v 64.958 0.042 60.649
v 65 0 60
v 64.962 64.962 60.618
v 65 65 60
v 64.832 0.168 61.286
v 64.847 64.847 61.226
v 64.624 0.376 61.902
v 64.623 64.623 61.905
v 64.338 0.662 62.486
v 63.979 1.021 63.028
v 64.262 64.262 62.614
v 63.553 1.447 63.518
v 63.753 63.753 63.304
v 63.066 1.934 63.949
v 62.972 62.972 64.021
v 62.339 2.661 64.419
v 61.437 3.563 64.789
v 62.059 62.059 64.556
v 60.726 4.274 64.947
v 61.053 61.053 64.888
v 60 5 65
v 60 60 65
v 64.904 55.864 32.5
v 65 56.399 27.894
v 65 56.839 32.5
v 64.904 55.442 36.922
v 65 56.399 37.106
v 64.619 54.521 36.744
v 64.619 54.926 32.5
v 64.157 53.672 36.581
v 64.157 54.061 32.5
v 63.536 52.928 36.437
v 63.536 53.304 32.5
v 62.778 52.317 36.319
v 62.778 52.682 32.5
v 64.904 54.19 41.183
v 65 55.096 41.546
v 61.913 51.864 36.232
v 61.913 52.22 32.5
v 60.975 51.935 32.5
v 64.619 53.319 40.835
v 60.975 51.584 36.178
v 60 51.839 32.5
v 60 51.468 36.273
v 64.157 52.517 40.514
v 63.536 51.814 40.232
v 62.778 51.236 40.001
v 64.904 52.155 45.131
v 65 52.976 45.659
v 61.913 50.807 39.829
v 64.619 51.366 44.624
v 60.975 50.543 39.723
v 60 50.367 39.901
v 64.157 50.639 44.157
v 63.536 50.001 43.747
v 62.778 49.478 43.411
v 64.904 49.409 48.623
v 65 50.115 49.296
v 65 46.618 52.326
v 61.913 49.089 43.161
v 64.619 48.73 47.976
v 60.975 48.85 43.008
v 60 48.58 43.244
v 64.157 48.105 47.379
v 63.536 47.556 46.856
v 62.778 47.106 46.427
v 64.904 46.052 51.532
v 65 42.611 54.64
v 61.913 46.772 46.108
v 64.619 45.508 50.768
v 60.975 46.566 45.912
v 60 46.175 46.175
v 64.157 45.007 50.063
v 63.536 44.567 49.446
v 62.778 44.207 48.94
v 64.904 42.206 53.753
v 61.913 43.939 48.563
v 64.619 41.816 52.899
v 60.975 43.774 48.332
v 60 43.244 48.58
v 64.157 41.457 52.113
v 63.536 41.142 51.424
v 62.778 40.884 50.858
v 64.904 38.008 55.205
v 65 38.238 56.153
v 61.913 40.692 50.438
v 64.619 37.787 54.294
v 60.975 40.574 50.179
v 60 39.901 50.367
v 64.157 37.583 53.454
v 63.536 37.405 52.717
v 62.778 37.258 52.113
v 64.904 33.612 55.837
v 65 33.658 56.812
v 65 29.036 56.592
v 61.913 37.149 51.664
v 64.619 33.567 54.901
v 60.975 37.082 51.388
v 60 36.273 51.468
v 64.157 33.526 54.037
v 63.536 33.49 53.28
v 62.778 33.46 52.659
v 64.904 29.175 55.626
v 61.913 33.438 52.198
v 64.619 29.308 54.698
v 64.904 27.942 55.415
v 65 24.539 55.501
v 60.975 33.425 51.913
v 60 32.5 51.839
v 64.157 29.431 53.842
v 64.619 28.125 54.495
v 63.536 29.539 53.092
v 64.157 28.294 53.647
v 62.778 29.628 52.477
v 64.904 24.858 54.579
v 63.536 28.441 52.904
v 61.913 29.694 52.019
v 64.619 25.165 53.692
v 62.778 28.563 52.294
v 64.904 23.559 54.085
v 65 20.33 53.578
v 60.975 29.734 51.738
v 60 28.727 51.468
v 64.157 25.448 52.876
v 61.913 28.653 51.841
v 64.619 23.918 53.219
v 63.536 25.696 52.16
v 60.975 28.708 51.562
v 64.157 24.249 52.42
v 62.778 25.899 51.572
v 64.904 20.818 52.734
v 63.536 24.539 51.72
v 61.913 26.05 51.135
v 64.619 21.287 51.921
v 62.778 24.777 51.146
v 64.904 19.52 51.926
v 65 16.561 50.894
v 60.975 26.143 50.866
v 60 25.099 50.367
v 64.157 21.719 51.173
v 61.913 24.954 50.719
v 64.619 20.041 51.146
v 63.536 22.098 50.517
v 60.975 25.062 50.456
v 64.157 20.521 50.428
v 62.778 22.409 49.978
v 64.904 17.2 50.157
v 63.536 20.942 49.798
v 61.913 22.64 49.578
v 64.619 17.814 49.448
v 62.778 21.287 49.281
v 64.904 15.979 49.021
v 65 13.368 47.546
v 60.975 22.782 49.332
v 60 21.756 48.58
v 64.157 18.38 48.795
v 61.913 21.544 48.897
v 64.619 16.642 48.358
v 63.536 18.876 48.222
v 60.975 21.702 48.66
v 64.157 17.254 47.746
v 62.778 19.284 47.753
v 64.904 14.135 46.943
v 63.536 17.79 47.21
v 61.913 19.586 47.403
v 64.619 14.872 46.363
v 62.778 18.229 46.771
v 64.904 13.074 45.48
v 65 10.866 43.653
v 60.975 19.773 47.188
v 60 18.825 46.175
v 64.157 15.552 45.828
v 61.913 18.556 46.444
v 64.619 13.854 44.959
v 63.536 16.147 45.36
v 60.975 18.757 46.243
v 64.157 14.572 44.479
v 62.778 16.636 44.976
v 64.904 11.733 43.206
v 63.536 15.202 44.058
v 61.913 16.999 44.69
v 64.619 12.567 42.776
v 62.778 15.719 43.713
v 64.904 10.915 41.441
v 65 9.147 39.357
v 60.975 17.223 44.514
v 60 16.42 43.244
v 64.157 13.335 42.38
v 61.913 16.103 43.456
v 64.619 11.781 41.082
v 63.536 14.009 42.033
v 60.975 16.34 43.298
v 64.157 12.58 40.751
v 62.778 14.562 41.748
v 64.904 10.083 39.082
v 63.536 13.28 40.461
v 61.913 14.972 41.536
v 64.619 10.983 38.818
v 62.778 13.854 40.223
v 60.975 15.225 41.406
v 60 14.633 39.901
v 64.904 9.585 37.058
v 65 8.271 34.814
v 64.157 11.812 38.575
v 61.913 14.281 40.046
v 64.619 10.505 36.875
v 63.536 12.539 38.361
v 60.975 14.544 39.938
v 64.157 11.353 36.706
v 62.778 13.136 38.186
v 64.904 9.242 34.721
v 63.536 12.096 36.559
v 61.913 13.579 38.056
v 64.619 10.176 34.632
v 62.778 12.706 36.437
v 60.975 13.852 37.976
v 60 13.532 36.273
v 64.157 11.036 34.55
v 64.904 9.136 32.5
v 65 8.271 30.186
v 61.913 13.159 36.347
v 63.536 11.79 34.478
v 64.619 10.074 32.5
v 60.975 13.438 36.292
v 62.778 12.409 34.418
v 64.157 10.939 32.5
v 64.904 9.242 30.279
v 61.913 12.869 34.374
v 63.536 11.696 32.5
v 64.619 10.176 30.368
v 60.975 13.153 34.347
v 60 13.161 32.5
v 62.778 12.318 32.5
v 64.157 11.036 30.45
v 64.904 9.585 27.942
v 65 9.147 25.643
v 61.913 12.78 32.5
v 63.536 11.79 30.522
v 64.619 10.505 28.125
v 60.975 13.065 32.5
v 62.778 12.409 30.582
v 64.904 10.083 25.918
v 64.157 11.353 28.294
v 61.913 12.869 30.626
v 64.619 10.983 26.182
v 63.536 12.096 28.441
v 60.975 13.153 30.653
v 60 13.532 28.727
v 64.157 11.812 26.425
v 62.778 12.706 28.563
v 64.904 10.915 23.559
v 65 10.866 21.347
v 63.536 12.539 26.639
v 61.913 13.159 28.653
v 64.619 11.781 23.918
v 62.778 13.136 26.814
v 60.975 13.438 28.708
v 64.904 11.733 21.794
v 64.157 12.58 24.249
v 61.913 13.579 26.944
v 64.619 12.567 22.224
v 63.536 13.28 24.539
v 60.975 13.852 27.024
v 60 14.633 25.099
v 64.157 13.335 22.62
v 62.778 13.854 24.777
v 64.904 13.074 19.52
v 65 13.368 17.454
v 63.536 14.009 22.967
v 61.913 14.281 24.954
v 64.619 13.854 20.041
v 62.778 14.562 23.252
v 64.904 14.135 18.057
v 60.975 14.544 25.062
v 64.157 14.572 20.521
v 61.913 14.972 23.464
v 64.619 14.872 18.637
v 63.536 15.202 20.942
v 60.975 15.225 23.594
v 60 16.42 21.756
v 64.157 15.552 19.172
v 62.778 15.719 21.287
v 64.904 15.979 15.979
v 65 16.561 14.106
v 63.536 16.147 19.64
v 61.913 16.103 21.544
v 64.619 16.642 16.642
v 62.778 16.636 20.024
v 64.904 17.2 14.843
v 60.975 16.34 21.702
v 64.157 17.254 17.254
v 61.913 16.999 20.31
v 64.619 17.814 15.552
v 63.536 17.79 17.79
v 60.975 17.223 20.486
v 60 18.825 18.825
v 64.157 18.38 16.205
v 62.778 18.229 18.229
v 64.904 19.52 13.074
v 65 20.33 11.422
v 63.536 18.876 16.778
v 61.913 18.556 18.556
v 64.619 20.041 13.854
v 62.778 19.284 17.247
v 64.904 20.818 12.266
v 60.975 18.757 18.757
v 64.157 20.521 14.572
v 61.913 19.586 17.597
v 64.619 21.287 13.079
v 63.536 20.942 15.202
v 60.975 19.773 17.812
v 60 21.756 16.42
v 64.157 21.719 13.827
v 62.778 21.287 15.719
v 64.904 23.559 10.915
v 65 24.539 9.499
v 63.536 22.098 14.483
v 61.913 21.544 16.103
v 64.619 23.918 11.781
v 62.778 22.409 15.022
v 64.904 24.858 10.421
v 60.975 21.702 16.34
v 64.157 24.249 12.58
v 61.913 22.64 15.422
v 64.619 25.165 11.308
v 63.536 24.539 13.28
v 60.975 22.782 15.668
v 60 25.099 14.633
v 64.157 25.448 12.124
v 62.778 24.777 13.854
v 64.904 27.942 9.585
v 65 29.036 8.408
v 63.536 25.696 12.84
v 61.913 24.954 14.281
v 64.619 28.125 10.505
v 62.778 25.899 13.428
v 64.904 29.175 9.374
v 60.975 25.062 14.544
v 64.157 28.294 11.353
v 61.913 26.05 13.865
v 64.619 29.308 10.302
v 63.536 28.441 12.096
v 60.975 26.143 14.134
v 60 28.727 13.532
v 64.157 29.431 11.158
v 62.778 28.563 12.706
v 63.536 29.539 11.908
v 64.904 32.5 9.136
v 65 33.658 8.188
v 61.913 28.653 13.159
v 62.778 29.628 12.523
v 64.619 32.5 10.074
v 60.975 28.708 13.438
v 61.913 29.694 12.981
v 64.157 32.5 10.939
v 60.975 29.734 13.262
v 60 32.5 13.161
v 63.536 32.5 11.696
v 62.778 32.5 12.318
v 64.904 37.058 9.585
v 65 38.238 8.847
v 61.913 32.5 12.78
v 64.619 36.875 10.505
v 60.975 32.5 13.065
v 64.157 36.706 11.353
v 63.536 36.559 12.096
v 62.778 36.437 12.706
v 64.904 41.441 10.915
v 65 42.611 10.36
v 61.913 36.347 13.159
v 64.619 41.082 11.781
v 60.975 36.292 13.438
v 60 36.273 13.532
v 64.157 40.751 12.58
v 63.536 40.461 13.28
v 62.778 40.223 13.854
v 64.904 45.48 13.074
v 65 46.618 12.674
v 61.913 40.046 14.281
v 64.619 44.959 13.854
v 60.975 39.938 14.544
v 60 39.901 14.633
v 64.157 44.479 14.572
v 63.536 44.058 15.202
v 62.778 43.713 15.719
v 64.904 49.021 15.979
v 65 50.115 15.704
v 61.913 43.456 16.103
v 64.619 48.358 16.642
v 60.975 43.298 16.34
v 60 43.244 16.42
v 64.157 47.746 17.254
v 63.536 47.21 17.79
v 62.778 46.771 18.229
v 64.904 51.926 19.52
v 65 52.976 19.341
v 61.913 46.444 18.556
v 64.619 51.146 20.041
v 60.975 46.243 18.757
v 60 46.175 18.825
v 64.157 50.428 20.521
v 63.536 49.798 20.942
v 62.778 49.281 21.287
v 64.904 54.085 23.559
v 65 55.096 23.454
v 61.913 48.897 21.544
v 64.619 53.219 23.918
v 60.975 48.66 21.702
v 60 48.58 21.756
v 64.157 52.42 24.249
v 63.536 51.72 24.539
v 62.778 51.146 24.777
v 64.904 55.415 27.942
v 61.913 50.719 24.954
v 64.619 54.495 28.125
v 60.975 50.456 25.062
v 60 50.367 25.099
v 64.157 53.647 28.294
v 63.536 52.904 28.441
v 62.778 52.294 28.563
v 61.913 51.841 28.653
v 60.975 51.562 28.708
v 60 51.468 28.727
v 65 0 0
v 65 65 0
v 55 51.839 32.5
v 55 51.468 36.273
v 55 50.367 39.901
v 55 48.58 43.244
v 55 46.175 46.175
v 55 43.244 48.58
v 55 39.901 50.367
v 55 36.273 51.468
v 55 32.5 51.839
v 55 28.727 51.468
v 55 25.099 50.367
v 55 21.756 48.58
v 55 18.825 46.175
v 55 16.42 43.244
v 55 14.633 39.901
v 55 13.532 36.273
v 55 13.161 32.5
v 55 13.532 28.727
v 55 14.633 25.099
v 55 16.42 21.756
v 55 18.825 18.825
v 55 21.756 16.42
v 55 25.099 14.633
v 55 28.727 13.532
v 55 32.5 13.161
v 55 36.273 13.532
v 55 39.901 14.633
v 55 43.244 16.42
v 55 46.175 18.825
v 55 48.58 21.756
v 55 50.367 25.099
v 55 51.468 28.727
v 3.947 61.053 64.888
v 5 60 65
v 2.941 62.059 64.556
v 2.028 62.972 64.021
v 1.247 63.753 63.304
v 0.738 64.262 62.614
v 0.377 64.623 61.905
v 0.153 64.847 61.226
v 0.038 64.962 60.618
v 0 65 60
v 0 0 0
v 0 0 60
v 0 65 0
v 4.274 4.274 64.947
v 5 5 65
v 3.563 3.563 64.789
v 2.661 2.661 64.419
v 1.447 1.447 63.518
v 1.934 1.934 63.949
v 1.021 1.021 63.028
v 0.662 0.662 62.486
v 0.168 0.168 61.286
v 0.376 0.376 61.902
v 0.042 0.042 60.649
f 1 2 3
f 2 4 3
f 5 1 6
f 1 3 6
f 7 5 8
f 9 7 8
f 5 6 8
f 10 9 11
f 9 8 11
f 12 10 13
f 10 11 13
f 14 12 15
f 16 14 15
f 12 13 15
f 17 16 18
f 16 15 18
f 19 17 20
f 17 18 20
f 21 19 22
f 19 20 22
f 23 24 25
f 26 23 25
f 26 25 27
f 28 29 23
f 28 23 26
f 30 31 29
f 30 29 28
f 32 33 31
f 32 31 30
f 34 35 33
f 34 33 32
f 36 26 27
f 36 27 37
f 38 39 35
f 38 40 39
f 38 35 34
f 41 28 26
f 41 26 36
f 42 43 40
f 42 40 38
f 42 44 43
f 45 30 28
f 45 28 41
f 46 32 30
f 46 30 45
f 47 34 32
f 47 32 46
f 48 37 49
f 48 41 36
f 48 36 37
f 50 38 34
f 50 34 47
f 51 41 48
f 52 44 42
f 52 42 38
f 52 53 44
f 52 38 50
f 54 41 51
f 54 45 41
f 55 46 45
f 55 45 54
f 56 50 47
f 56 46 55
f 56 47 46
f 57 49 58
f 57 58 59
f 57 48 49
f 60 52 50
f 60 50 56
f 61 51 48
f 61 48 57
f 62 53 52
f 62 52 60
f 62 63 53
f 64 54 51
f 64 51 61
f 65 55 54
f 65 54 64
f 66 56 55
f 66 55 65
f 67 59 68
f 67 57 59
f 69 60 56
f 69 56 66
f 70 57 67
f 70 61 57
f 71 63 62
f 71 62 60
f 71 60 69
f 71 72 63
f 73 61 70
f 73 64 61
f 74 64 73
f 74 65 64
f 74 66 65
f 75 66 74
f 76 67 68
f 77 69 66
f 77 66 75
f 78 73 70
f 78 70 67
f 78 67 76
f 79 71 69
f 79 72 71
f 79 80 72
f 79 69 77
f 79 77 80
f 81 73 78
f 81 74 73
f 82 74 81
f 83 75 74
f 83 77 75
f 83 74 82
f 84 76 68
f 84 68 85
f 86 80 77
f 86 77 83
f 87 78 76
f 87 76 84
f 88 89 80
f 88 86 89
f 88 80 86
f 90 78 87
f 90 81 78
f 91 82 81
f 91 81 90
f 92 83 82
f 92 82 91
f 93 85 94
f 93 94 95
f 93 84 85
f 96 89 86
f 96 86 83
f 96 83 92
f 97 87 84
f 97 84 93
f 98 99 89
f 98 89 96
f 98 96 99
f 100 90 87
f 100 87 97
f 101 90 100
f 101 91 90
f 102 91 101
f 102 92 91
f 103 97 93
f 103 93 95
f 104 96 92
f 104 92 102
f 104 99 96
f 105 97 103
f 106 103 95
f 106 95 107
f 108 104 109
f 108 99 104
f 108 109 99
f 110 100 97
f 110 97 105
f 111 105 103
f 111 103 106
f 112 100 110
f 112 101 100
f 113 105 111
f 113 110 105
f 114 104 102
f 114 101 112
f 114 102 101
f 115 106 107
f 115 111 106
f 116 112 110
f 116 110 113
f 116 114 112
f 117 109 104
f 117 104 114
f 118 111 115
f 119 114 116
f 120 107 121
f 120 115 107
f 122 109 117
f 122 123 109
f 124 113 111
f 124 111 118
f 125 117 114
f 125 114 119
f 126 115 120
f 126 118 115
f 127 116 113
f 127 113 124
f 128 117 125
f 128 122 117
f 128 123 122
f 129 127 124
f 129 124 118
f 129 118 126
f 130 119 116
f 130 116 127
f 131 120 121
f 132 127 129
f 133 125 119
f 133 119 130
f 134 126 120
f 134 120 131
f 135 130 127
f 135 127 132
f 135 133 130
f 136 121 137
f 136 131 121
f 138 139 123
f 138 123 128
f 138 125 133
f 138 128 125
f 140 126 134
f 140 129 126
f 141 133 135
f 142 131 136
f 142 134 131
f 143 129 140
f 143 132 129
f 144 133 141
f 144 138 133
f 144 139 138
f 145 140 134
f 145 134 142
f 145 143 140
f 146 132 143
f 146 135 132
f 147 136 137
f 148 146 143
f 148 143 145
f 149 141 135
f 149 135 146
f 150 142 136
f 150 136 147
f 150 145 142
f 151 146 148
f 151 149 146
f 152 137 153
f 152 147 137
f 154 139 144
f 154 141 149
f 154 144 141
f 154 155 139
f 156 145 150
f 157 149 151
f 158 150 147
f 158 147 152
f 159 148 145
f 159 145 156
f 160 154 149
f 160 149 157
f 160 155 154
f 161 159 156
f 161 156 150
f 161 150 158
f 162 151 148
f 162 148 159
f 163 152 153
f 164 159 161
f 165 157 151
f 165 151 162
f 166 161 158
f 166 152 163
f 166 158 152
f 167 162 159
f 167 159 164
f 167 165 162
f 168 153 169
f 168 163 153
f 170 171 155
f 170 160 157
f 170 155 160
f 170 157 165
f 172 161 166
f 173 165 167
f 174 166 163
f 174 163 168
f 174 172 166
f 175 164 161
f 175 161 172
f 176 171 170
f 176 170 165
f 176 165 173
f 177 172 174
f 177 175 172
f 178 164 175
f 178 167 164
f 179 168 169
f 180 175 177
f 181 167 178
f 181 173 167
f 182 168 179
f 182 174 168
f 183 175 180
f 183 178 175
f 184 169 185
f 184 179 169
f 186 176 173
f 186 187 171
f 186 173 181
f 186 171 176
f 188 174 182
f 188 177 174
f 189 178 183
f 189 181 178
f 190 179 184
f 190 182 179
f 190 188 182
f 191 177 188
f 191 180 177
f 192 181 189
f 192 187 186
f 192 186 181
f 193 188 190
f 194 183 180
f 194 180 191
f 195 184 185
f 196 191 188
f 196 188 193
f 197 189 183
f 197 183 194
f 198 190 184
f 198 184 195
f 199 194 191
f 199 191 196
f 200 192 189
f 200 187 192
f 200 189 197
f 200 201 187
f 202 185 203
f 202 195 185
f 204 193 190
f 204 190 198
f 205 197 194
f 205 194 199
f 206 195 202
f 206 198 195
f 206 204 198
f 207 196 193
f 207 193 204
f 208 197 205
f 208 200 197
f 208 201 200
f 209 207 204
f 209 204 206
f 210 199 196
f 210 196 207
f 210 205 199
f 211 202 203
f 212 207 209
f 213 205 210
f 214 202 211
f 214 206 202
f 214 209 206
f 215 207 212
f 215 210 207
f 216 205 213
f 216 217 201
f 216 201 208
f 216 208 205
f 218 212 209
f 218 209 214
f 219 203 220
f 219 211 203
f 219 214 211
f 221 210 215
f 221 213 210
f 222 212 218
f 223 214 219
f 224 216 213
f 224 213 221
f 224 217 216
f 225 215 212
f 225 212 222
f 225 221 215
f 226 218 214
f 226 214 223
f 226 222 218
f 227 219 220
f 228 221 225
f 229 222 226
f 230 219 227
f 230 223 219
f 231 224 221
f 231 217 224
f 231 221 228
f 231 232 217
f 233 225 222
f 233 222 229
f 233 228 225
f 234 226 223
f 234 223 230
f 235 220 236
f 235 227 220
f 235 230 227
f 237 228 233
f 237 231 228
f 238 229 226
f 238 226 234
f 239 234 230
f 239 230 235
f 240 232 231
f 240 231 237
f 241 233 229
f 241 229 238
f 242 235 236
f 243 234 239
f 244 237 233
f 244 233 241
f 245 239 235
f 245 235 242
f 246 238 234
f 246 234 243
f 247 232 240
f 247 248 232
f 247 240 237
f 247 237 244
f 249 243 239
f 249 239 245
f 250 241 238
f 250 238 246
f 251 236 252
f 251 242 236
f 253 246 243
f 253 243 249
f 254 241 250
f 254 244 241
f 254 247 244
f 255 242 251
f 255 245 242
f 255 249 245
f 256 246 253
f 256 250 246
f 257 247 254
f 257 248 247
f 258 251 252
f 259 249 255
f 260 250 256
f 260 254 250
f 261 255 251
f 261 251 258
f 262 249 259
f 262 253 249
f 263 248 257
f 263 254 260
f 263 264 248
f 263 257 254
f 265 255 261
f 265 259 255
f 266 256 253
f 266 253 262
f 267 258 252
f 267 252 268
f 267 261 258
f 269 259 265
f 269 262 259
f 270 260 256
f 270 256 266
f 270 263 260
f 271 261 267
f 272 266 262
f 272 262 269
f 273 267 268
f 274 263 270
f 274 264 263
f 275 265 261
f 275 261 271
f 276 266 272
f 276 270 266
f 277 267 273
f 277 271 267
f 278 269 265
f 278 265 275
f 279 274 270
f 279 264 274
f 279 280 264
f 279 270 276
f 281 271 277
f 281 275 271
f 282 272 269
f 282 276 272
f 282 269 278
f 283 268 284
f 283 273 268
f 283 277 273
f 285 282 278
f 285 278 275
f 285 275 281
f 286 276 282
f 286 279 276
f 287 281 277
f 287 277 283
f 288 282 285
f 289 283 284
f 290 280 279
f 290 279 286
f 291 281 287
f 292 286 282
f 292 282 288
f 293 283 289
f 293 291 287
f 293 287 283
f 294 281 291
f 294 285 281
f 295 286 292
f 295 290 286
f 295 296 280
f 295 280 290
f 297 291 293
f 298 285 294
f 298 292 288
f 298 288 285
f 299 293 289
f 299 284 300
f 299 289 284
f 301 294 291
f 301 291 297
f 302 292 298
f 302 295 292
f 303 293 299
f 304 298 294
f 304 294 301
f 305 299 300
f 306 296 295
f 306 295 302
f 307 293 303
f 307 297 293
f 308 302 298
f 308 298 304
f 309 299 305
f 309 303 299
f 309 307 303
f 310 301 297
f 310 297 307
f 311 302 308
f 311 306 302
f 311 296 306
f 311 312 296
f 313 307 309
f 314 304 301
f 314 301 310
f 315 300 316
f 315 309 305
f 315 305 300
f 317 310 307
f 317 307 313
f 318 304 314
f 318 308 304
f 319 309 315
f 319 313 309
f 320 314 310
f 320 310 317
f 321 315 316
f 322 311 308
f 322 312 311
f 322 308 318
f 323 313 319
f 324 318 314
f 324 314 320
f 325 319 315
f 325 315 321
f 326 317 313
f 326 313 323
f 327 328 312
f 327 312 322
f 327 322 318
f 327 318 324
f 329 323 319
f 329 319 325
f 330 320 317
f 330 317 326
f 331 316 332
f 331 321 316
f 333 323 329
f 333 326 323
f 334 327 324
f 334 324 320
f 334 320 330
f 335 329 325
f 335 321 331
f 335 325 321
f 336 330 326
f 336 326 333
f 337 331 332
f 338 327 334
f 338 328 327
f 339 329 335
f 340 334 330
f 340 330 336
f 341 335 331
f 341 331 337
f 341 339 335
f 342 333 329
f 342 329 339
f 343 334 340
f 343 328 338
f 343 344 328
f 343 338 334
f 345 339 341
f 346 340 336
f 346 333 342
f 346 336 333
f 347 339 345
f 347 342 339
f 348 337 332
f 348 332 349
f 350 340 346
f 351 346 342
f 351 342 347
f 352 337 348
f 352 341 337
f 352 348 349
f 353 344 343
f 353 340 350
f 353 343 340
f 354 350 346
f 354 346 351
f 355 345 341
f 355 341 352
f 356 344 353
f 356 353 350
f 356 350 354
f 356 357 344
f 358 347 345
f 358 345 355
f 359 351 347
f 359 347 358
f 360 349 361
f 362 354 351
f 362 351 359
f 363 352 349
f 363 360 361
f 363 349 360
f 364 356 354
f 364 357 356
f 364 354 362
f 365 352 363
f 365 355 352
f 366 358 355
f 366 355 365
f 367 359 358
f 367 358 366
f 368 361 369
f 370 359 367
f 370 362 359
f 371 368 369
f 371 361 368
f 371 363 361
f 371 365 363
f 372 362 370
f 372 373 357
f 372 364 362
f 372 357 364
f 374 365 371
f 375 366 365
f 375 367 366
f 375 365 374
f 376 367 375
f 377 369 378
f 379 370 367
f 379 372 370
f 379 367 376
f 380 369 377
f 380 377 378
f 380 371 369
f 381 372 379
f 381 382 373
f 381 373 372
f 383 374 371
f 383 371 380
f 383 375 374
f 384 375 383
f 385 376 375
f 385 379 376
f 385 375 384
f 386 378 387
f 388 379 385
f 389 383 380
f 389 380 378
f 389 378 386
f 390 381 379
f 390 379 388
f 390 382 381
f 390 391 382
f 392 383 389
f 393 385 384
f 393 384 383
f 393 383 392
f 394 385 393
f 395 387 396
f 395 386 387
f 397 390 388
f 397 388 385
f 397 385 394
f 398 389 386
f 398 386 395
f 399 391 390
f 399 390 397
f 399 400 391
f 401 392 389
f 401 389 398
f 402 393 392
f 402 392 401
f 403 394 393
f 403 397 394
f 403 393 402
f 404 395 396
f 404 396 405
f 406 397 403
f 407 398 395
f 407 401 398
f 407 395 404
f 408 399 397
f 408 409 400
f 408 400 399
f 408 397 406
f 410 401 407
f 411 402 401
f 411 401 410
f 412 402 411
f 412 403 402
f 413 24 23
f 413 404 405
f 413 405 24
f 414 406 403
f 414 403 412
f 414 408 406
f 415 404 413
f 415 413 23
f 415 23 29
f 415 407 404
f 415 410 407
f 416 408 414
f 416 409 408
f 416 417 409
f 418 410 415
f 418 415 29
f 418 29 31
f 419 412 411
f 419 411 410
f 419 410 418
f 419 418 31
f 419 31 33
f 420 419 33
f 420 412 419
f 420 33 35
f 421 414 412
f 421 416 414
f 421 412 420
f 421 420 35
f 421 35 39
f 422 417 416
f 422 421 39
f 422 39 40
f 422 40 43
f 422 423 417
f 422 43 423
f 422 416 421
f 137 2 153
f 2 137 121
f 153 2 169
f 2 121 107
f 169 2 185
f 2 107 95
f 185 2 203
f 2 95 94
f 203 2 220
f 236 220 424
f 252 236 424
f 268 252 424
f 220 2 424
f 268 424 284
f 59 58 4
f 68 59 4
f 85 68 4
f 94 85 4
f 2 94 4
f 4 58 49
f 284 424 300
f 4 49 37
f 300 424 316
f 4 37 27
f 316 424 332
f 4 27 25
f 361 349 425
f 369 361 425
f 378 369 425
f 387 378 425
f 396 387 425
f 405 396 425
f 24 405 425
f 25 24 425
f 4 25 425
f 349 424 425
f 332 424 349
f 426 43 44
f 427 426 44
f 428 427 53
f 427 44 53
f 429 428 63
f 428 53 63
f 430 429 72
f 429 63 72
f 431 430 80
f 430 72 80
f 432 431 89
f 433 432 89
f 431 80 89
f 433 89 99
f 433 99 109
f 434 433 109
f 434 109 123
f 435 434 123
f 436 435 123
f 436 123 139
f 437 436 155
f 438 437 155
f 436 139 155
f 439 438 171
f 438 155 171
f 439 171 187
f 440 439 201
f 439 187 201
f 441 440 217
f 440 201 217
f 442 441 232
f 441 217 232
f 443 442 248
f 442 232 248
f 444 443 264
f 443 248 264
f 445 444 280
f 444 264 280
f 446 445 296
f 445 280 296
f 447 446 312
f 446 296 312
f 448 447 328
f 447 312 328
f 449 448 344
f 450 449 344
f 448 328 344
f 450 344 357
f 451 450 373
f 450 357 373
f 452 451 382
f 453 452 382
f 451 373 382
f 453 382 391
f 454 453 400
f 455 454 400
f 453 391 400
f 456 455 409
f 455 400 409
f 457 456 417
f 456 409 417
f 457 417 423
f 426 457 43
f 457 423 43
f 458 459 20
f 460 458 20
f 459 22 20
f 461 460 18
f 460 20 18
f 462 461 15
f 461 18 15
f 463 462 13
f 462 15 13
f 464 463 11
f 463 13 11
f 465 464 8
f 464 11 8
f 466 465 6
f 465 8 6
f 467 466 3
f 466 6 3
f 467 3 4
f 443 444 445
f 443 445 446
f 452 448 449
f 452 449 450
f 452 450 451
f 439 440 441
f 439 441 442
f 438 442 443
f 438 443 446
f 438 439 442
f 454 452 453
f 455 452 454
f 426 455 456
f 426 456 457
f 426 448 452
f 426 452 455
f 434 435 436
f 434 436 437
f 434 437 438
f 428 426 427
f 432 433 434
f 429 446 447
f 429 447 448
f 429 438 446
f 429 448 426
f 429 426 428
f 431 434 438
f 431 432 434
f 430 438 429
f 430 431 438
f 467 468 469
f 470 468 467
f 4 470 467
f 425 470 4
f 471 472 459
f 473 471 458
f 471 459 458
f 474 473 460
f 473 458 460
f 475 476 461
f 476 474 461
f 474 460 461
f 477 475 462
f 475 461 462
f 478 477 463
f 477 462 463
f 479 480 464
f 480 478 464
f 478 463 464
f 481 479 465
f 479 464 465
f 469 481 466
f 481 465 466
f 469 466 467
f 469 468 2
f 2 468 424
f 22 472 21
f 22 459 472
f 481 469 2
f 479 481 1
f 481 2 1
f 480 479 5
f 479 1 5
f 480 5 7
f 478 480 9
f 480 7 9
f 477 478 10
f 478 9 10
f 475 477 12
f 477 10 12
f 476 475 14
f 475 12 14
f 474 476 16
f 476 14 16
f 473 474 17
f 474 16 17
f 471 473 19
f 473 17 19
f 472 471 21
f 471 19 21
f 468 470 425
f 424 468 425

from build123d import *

# Parameters (mm, degrees)
BOX_W        = 65
BOX_H        = 65
BOX_DEPTH    = 65
SKETCH_R     = 19.339319
POCKET_DEPTH = 10
FILLET_R     = 5
FILLET001_R  = 5


with BuildPart() as part:
    # Box → Box (new body)
    with BuildSketch(Plane.XY):
        with Locations((32.5, 32.5)):
            Rectangle(BOX_W, BOX_H)
    extrude(amount=BOX_DEPTH)

    # Sketch → Pocket (cut)
    with BuildSketch(Plane.YZ.offset(65)):
        with Locations((32.5, 32.5)):
            Circle(SKETCH_R)
    extrude(amount=-POCKET_DEPTH, mode=Mode.SUBTRACT)

    # Fillet
    fillet_edges = [part.edges().sort_by_distance(p)[0] for p in [
        (65, 13.160681, 32.5),
    ]]
    fillet(fillet_edges, radius=FILLET_R)

    # Fillet001
    fillet001_edges = [part.edges().sort_by_distance(p)[0] for p in [
        (32.5, 0, 65),
        (32.5, 65, 65),
        (65, 32.5, 65),
        (0, 32.5, 65),
    ]]
    fillet(fillet001_edges, radius=FILLET001_R)


solid = part.part
